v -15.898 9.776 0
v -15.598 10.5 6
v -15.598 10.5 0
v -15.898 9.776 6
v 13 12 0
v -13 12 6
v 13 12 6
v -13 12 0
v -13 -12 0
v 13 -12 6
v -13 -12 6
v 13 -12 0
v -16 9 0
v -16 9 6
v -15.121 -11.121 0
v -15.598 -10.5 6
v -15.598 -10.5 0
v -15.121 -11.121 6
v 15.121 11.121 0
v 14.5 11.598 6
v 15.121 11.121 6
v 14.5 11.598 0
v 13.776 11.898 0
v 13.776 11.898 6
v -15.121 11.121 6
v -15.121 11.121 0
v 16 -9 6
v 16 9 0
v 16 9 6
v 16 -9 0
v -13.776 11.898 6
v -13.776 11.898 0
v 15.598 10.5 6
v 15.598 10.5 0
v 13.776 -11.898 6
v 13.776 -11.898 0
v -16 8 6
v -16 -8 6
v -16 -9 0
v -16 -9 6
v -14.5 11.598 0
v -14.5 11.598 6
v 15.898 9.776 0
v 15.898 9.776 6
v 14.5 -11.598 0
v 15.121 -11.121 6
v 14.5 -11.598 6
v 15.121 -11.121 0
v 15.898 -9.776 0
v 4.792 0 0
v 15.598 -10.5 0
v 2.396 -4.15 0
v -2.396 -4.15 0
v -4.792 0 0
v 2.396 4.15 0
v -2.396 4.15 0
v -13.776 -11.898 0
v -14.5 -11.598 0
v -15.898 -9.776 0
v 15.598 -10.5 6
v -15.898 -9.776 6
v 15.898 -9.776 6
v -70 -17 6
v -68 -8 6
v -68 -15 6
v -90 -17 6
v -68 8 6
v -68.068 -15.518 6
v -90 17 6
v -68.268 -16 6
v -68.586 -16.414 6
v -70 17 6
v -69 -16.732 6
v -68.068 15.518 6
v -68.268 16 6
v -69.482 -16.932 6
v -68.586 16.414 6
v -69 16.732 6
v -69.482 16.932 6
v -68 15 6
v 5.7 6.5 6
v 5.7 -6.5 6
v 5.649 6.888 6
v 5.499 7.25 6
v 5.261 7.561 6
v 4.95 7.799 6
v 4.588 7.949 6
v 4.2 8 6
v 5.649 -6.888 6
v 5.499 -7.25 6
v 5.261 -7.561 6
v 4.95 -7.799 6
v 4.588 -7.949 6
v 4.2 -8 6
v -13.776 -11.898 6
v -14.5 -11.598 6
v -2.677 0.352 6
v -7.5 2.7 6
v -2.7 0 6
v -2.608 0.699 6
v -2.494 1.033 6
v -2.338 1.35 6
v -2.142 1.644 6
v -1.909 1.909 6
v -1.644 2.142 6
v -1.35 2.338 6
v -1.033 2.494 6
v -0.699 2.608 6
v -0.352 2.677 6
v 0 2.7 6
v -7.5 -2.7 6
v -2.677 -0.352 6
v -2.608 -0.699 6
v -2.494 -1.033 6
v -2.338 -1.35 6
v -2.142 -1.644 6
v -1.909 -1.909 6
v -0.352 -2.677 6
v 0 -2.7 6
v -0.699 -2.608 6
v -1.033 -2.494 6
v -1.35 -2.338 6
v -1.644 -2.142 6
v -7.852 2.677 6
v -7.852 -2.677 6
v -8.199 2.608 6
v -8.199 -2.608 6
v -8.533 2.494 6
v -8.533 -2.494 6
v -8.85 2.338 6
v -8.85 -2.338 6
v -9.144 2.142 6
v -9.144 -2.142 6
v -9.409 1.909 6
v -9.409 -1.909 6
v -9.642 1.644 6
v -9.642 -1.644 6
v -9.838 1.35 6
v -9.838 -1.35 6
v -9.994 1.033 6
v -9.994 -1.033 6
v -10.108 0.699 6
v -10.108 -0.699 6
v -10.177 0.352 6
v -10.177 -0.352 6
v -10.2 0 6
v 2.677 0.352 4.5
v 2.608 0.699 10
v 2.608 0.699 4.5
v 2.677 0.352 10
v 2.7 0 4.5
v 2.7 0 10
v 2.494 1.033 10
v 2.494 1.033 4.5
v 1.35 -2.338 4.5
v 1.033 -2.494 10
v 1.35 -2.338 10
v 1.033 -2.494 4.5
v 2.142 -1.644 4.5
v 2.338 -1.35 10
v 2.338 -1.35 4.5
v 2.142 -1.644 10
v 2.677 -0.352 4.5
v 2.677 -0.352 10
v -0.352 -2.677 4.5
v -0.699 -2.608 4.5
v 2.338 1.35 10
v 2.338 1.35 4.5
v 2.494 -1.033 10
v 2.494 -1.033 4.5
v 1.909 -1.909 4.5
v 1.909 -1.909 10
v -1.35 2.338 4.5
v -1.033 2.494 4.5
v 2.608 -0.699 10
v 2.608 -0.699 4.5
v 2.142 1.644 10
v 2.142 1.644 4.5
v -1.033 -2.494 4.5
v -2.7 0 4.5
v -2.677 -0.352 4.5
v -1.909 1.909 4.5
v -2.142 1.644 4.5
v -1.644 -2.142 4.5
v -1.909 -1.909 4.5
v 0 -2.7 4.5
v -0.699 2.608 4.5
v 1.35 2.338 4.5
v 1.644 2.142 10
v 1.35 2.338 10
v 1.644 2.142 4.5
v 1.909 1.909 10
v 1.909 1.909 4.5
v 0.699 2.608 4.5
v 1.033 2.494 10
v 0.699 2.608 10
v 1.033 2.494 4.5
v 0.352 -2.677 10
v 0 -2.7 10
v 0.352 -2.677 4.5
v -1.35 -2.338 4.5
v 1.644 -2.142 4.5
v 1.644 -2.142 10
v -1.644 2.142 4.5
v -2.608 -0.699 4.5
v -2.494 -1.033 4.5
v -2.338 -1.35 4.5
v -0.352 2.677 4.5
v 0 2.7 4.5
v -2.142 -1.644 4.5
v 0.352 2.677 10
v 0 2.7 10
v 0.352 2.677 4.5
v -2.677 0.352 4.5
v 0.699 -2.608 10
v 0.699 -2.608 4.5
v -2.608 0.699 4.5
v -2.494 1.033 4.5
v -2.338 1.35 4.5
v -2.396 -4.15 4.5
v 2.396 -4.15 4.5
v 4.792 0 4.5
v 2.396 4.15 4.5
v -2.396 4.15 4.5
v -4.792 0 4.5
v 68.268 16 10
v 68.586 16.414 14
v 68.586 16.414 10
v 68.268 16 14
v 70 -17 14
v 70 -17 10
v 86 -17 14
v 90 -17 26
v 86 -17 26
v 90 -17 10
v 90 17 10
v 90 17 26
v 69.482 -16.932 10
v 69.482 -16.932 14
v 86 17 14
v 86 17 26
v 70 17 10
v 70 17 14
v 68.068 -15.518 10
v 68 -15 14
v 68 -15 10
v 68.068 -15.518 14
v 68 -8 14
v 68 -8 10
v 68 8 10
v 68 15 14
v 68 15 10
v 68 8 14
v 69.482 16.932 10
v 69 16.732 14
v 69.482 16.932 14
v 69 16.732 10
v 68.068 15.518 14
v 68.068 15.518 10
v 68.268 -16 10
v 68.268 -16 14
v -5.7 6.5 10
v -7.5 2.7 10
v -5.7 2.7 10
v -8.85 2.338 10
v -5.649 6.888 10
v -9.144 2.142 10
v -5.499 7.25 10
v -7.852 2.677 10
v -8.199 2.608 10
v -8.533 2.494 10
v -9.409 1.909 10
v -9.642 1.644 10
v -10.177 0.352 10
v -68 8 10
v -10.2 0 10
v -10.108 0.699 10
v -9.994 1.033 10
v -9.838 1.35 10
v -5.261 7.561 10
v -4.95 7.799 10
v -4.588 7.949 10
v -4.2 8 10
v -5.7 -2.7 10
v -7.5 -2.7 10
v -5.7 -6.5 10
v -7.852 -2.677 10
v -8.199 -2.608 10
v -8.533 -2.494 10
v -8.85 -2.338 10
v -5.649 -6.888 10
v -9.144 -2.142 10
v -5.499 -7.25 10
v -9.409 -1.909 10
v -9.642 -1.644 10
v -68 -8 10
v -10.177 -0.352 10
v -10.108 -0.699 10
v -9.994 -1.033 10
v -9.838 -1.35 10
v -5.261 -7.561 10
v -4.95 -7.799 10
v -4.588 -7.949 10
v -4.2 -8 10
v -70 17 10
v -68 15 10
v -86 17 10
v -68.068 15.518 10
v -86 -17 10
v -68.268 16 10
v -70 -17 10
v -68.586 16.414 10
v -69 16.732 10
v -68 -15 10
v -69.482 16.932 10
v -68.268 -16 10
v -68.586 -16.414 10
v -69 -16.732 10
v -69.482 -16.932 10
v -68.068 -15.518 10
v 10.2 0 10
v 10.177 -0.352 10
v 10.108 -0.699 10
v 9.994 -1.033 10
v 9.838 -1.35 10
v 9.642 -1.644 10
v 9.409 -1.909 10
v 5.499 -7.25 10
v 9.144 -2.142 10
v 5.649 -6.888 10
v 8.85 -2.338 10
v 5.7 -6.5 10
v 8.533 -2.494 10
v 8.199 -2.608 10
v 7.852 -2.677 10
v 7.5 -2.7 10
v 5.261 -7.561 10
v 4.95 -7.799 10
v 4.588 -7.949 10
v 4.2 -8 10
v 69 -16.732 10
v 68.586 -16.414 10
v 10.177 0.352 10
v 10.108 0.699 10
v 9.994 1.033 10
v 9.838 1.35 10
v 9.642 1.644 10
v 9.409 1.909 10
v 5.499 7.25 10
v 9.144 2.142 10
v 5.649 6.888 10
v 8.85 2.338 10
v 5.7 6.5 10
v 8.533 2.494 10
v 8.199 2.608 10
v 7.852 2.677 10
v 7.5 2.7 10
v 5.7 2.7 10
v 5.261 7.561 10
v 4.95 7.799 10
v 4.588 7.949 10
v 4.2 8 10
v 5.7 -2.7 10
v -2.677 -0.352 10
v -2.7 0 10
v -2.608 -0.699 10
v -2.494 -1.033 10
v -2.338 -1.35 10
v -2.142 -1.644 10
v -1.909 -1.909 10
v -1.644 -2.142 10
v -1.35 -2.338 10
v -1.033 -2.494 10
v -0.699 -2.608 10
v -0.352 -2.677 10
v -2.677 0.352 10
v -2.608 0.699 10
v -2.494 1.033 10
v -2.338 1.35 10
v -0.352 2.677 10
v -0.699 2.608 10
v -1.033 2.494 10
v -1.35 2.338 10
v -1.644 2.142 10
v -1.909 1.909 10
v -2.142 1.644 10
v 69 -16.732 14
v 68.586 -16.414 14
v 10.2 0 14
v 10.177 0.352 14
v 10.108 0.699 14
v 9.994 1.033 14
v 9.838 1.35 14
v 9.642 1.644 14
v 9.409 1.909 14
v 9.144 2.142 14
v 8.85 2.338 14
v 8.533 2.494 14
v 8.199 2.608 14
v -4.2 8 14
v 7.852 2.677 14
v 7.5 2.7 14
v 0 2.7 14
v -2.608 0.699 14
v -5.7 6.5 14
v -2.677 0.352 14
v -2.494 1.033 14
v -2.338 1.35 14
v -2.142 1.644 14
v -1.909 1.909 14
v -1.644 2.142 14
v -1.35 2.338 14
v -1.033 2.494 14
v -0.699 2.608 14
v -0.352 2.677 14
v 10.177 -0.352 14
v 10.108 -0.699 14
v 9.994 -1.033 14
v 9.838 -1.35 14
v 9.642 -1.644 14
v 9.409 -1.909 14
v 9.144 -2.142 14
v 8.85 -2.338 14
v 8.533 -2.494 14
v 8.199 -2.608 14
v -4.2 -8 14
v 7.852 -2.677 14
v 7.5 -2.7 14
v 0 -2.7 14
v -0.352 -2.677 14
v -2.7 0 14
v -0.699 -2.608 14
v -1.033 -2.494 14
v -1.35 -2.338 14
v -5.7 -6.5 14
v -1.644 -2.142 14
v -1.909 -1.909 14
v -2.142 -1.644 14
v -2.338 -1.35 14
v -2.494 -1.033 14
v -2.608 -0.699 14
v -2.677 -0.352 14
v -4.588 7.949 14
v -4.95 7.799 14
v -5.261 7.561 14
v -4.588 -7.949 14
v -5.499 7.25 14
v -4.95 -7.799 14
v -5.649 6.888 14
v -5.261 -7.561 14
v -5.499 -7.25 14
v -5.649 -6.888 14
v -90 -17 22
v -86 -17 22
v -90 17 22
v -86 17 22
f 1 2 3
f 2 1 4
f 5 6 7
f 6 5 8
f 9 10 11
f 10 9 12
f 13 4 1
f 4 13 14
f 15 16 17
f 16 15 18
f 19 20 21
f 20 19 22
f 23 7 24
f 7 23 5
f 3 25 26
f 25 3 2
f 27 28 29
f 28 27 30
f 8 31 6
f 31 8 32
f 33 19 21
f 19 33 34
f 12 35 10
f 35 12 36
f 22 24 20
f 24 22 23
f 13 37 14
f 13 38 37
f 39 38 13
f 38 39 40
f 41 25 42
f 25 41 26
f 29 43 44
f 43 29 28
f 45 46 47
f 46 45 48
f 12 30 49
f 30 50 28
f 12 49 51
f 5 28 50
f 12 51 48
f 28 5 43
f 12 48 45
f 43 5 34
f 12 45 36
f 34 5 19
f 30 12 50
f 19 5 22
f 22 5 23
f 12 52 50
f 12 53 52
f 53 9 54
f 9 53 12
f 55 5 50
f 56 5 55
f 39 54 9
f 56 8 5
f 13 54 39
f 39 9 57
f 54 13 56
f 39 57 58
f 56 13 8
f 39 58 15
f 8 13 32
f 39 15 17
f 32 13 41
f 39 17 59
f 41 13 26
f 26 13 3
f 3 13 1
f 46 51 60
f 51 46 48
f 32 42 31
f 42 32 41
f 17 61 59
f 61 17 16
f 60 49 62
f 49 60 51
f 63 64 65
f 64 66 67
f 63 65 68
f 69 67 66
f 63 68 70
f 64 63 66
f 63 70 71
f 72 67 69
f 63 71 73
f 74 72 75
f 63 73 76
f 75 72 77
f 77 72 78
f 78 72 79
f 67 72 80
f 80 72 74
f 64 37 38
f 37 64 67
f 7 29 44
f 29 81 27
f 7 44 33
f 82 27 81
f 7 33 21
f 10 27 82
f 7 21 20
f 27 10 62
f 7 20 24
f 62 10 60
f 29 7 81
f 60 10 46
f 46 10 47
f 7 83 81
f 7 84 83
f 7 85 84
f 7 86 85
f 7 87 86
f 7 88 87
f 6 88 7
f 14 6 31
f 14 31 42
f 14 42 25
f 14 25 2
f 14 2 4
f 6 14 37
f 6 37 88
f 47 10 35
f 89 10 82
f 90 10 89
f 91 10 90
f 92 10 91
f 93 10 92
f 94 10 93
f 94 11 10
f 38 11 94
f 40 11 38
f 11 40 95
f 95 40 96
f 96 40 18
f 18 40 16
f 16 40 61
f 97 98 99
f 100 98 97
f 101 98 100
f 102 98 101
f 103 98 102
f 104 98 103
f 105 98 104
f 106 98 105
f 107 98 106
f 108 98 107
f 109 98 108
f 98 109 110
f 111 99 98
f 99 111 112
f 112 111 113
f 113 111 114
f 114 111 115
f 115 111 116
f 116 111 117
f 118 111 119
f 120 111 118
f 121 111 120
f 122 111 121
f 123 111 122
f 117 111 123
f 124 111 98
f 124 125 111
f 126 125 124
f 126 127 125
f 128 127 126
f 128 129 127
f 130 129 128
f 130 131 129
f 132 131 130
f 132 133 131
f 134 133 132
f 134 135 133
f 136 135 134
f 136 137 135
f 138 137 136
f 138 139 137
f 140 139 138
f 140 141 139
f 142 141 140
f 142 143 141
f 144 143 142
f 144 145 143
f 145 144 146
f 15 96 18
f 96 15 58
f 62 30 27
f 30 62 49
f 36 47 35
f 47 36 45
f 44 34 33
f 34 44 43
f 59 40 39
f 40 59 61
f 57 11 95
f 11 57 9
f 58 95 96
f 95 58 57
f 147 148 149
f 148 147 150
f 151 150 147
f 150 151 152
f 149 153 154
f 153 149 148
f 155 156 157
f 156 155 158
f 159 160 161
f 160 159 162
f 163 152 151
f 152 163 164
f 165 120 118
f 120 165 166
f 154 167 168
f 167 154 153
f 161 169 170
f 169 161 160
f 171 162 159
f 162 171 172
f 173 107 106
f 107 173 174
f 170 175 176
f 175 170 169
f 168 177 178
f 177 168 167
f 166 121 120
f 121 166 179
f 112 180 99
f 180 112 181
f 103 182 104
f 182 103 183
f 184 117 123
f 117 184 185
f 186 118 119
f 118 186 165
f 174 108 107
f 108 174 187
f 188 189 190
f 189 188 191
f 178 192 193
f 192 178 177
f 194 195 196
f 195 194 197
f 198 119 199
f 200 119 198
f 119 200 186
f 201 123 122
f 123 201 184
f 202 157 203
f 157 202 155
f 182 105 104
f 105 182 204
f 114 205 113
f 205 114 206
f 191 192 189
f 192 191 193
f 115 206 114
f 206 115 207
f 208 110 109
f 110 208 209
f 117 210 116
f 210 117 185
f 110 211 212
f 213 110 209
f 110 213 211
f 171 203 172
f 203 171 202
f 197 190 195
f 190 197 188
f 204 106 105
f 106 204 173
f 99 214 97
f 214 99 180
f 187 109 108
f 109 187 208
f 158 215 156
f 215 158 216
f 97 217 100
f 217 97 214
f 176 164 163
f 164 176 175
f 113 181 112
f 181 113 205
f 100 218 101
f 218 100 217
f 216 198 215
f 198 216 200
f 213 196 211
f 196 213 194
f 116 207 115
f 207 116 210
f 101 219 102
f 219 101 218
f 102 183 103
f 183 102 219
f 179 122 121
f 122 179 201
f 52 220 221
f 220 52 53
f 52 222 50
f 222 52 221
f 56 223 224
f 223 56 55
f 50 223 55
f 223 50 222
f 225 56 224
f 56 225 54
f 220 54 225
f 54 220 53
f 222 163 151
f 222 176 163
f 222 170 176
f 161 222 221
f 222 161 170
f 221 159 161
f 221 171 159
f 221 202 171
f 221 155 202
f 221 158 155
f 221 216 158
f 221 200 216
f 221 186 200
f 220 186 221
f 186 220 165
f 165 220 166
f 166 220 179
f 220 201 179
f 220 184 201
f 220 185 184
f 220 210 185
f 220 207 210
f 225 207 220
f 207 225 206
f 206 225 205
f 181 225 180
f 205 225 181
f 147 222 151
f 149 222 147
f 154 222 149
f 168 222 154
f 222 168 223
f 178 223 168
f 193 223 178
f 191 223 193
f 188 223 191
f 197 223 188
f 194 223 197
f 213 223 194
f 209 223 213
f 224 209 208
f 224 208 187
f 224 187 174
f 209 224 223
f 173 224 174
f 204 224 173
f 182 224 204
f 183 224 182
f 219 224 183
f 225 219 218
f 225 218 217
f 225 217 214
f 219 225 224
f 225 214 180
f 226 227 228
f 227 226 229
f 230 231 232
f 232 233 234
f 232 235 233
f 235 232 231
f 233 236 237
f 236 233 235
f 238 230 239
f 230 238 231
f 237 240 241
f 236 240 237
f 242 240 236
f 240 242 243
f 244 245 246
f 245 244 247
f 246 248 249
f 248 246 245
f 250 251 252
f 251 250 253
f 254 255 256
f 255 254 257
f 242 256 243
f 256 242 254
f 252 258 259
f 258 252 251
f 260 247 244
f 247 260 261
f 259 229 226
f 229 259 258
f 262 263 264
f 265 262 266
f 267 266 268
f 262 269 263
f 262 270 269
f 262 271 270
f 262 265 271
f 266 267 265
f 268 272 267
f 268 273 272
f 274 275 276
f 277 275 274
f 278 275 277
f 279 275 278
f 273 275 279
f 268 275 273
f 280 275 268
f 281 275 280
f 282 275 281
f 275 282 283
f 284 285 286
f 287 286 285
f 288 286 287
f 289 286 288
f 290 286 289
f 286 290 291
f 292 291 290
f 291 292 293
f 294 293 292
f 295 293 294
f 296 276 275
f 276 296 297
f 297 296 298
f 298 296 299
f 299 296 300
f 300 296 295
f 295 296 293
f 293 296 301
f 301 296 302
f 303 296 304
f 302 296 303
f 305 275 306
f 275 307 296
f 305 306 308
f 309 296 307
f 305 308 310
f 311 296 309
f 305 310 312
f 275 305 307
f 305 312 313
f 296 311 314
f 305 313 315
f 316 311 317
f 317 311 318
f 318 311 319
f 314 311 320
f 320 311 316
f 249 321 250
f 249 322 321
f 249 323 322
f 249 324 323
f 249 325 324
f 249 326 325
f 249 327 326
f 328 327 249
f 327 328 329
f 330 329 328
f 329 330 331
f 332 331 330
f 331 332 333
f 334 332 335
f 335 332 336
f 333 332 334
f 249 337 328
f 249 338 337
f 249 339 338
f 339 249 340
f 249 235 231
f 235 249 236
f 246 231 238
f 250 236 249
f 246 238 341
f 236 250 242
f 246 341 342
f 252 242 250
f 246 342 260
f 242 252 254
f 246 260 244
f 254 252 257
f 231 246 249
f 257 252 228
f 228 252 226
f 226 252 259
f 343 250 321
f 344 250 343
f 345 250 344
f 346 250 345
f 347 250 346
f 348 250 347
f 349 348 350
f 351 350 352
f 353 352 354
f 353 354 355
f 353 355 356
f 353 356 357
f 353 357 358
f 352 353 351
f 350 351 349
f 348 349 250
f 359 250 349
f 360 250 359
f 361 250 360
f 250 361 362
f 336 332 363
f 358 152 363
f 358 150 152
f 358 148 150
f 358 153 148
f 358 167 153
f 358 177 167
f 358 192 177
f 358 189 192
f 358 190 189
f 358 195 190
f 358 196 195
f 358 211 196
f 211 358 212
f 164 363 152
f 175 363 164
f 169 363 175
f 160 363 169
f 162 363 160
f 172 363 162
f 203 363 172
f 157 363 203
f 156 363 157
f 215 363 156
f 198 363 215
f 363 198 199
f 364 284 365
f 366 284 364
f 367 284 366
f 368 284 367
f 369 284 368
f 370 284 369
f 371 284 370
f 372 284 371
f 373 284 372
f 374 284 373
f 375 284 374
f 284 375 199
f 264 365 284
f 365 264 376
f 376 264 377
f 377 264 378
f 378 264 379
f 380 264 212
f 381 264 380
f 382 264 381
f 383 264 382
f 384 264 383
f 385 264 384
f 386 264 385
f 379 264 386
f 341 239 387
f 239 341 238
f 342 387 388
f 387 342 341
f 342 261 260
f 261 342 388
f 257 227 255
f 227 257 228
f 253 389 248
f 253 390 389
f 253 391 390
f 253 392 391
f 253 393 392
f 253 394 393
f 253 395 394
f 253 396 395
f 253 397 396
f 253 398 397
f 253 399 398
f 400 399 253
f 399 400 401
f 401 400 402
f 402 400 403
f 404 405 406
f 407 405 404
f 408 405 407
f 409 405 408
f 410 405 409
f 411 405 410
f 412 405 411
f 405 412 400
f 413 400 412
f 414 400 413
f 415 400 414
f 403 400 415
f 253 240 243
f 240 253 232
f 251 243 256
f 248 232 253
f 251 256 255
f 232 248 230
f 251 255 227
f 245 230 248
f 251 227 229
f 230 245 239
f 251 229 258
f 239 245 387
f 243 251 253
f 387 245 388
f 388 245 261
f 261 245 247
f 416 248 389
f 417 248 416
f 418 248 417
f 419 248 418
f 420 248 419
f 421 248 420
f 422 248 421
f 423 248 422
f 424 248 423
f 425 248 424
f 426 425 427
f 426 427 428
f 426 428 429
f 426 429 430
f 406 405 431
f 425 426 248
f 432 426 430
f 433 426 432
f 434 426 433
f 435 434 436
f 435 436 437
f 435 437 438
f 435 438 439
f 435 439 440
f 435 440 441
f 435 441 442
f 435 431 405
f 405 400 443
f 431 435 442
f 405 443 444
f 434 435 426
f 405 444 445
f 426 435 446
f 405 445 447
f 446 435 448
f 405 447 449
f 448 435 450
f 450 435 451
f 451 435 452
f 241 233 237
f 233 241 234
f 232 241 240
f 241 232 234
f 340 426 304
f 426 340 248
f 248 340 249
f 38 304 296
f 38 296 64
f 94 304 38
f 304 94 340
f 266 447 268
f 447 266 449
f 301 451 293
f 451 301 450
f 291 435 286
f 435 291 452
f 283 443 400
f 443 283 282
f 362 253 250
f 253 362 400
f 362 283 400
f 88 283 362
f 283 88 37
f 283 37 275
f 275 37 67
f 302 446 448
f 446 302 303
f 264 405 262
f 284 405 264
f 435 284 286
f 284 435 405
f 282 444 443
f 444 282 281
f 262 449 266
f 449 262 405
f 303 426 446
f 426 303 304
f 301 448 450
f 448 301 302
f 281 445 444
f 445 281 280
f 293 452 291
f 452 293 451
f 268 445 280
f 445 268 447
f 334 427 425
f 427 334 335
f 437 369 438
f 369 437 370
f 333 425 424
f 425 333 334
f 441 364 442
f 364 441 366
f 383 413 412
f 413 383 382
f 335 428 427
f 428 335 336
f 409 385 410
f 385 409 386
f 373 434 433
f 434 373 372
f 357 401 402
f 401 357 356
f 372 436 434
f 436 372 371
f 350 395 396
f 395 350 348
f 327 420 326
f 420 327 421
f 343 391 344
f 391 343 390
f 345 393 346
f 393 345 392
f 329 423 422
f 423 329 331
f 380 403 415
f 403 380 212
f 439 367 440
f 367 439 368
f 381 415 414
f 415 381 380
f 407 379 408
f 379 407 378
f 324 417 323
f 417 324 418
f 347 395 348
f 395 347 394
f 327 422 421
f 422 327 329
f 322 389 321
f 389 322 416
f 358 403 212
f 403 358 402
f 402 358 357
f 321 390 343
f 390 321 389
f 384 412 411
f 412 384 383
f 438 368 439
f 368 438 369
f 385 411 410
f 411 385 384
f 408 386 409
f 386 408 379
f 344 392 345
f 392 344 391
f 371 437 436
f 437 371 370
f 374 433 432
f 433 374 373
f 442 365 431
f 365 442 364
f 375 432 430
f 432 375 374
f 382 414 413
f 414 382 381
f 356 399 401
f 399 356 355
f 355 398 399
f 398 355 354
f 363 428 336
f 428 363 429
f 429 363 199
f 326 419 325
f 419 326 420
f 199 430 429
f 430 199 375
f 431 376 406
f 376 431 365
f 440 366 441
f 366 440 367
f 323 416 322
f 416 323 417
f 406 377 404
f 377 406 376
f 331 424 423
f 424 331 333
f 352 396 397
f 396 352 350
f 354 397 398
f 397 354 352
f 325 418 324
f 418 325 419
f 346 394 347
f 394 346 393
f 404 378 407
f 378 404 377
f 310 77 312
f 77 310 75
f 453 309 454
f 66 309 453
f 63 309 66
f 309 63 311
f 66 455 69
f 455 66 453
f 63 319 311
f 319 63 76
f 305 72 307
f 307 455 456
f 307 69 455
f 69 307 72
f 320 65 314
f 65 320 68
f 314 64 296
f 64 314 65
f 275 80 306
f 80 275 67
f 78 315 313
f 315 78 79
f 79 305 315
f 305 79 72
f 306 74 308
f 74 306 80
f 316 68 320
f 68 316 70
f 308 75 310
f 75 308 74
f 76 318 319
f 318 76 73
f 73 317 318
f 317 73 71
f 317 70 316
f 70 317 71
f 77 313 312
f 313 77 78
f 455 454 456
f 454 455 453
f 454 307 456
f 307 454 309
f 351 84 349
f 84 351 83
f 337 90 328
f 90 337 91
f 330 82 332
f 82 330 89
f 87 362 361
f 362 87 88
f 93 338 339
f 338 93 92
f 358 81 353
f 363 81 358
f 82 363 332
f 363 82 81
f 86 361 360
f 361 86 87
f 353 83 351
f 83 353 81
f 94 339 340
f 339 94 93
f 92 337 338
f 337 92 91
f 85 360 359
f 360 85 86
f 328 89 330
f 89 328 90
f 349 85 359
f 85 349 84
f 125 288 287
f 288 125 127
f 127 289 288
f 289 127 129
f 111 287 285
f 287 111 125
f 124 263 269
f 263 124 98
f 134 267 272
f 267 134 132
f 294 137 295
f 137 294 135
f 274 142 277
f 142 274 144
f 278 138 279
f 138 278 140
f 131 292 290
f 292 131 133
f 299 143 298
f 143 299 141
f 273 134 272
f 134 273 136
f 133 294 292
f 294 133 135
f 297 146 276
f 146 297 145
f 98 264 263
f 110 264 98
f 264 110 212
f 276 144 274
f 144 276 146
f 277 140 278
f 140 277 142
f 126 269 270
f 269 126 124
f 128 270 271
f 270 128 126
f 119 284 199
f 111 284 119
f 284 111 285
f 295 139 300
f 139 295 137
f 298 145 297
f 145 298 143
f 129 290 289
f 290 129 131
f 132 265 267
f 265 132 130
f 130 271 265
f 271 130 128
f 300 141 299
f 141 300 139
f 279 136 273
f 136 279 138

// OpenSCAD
// =====================================================================
//  Étrier réglable pour scotcher 2 ventilateurs sur un radiateur
// =====================================================================
//
//  Principe :
//    - Un socle central fixe.
//    - Deux bras plats coulissants (droite / gauche), chacun terminé
//      par une patte en L sur laquelle on colle le scotch double-face
//      contre le ventilateur.
//    - Chaque bras a un trou oblong (une "course" de 7.5 mm) traversé
//      par UNE vis centrale M5 commune aux deux bras, empilés l'un sur
//      l'autre au-dessus du socle.
//    - On règle l'écartement des deux pattes à la main (de ecart_max,
//      position ouverte, à ecart_min, position resserrée), puis on
//      serre la vis centrale : elle plaque les deux bras l'un contre
//      l'autre et contre le socle, et les bloque par friction, comme
//      la vis de blocage d'une jambe de force / d'un support de carte
//      graphique.
//
//  Impression (3 pièces) :
//    - 1x socle()  -> piece = "socle"
//    - 2x bras()   -> piece = "bras"  (imprimer 2 fois LA MÊME pièce ;
//      pour le bras gauche, prendre la 2e pièce imprimée et la tourner
//      de 180° autour de l'axe vertical avant montage : la pièce est
//      symétrique, inutile de la mettre en miroir dans le slicer)
//
//  Visserie : 1 vis M5 (tête bombée ou fraisée) + 1 écrou M5,
//    longueur de vis conseillée >= hauteur_socle + 2*epaisseur_bras + 8mm
//    (avec les valeurs par défaut : 6 + 2*4 + 8 = 22 -> prendre du M5x25).
//    Glisser une rondelle large (diamètre >= 15mm, cf. diam_rondelle)
//    sous la tête de vis pour qu'elle plaque bien sur toute la longueur
//    du trou oblong, quelle que soit la position choisie.
//
//  Toutes les cotes sont paramétriques : ajuste ecart_max / ecart_min
//  et les dimensions des pattes à ton radiateur / tes ventilateurs.
// =====================================================================

/* [Rendu] */
piece = "assemblage"; // ["assemblage","socle","bras"]
position_apercu = "ouvert"; // ["ouvert","ferme"] (utilisé seulement si piece = "assemblage")

/* [Ecartement exterieur des pattes (mm)] */
ecart_max = 180; // position ouverte
ecart_min = 165; // position resserree (vers le centre)

/* [Bras coulissant] */
epaisseur_bras = 4;
largeur_bras   = 16;

/* [Patte de fixation (semelle collee au scotch double-face)] */
largeur_patte   = 34;
longueur_patte  = 22;
epaisseur_patte = 4;
hauteur_rebord  = 16;  // rebord en L, prend appui sur le bord du radiateur/ventilo
rayon_arrondi   = 2;

/* [Socle central] */
longueur_socle       = 32;
hauteur_socle        = 6;
rayon_arrondi_socle  = 3;

/* [Visserie M5] */
diam_vis          = 5.4;  // passage de la tige (M5 + jeu)
entredeplats_ecrou = 8.3; // ecrou M5 (8mm) + jeu
haut_ecrou        = 4.5;  // hauteur de l'empreinte hexagonale
diam_rondelle     = 15;   // diametre mini de rondelle conseille (info)
jeu               = 0.3;

$fn = 48;

// ---- Valeurs calculees ----
travel        = (ecart_max - ecart_min) / 2; // course de chaque bras
longueur_bras = ecart_max / 2;               // du centre a l'extremite de la patte, position ouverte
largeur_socle = largeur_bras + 8;

echo(str("Course par bras : ", travel, " mm"));
echo(str("Vis M5 conseillee : longueur >= ", hauteur_socle + 2*epaisseur_bras + 8, " mm"));

// =====================================================================
//  Modules utilitaires
// =====================================================================
module boite_arrondie(l, w, h, r) {
    hull() {
        for (x = [r, l - r], y = [r, w - r])
            translate([x, y, 0]) cylinder(r = r, h = h, $fn = 24);
    }
}

module ecrou_hexa(entredeplats, h) {
    // cylindre a 6 faces : le parametre d de cylinder() est le diametre
    // circonscrit (pointe a pointe), a deduire de l'entre-plats
    cylinder(d = entredeplats / cos(30), h = h, $fn = 6);
}

// =====================================================================
//  Socle central (1x a imprimer)
// =====================================================================
module socle() {
    difference() {
        translate([-longueur_socle/2, -largeur_socle/2, 0])
            boite_arrondie(longueur_socle, largeur_socle, hauteur_socle, rayon_arrondi_socle);

        // passage de la vis, sur toute la hauteur du socle
        translate([0, 0, -1])
            cylinder(d = diam_vis, h = hauteur_socle + 2);

        // empreinte hexagonale de l'ecrou, debouchante sous le socle
        translate([0, 0, -0.5])
            ecrou_hexa(entredeplats_ecrou, haut_ecrou + 0.5);
    }
}

// =====================================================================
//  Bras coulissant + patte (imprimer 2x la meme piece)
//  Repere local : x=0 -> debut de la course de la vis (cote centre)
//                 x=longueur_bras -> extremite de la patte
// =====================================================================
module bras() {
    marge = diam_vis/2 + 3;

    union() {
        // barre plate coulissante
        translate([-marge, -largeur_bras/2, 0])
            boite_arrondie(marge + longueur_bras, largeur_bras, epaisseur_bras, 1.5);

        // patte terminale : semelle + rebord en L
        translate([longueur_bras - longueur_patte, -largeur_patte/2, 0]) {
            boite_arrondie(longueur_patte, largeur_patte, epaisseur_patte, rayon_arrondi);
            translate([longueur_patte - epaisseur_patte, 0, 0])
                cube([epaisseur_patte, largeur_patte, hauteur_rebord]);
        }
    }
}

module bras_perce() {
    difference() {
        bras();
        // trou oblong (course = travel) pour la vis centrale commune
        translate([0, 0, -1])
            hull() {
                cylinder(d = diam_vis, h = epaisseur_bras + 2);
                translate([travel, 0, 0]) cylinder(d = diam_vis, h = epaisseur_bras + 2);
            }
    }
}

// =====================================================================
//  Assemblage (apercu du montage, ne pas exporter tel quel en STL)
// =====================================================================
module assemblage(position) {
    dx = (position == "ouvert") ? 0 : -travel;

    socle();

    // bras droit (au-dessus)
    translate([dx, 0, hauteur_socle + epaisseur_bras])
        bras_perce();

    // bras gauche (en dessous, symetrique)
    mirror([1, 0, 0])
        translate([dx, 0, hauteur_socle])
            bras_perce();
}

// =====================================================================
//  Selection de la piece a afficher / exporter
// =====================================================================
if (piece == "assemblage") {
    assemblage(position_apercu);
} else if (piece == "socle") {
    socle();
} else if (piece == "bras") {
    bras_perce();
}
